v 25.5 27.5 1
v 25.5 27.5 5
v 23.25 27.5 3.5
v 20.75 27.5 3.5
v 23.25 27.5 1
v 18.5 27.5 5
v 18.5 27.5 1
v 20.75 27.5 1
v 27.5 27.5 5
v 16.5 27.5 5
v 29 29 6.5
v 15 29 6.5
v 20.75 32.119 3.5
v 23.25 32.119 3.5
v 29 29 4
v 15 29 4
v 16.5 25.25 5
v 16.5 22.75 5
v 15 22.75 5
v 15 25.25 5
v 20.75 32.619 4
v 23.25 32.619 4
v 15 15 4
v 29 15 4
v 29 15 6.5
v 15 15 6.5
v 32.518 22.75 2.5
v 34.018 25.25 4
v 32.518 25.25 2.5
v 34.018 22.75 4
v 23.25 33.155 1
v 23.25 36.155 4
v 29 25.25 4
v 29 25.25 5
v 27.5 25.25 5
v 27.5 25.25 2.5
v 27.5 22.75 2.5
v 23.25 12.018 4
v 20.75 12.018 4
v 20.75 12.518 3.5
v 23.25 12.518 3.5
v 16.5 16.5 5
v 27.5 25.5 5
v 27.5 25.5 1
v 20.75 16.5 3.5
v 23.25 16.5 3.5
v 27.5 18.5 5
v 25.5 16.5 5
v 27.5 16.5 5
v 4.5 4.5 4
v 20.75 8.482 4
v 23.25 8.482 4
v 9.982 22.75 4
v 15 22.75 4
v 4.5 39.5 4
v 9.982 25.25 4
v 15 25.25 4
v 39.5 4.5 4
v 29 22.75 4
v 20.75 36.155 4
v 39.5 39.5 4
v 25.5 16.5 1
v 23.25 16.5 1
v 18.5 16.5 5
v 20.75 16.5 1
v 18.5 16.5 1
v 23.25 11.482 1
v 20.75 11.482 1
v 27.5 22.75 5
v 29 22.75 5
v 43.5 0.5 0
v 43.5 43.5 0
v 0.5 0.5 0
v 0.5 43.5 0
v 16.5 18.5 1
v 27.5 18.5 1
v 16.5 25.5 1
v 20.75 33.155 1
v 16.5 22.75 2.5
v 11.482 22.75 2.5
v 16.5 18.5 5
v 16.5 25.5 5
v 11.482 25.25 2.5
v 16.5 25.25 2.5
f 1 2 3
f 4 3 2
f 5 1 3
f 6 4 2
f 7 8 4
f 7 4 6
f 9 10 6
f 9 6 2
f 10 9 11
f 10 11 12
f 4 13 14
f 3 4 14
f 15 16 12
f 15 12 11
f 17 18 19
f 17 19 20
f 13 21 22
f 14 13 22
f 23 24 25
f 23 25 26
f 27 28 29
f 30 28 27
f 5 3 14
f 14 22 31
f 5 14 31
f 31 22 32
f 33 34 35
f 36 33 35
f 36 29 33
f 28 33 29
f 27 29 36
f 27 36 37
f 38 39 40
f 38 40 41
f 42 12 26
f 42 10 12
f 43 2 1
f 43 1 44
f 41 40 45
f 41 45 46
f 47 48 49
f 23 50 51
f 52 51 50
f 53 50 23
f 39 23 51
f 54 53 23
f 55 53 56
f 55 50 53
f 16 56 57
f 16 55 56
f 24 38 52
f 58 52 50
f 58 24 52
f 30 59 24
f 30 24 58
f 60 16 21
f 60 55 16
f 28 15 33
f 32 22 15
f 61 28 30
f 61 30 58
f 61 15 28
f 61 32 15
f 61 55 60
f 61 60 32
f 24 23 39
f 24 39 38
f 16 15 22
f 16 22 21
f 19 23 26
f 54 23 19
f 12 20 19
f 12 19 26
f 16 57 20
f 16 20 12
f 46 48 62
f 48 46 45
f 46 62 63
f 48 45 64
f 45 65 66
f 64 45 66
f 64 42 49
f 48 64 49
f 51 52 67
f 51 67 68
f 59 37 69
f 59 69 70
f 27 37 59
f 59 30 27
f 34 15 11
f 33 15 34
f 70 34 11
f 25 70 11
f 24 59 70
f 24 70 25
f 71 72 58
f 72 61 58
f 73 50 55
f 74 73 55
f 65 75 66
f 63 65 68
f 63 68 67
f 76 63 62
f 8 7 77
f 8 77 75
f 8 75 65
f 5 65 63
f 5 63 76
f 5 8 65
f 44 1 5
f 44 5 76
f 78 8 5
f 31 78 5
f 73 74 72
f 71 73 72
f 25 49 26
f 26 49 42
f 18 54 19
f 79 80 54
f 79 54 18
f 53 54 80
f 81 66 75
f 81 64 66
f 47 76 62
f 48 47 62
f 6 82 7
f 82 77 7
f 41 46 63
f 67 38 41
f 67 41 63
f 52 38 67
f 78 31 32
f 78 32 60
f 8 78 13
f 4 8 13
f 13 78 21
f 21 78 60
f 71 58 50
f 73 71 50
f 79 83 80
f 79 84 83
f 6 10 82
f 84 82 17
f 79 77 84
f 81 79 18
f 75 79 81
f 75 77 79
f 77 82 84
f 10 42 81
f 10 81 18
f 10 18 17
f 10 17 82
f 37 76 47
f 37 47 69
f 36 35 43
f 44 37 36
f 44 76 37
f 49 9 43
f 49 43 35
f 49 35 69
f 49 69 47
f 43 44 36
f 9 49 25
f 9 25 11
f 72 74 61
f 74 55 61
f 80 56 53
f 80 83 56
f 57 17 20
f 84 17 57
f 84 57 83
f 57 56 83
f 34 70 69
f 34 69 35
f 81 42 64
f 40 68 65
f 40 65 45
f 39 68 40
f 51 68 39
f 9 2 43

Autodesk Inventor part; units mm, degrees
ref_plane "YZ Plane" through (0, 0, 0) normal (1, 0, 0) x (0, 1, 0)
ref_plane "XZ Plane" through (0, 0, 0) normal (0, 1, 0) x (-1, 0, 0)
sketch "Sketch1" plane through (0, 0, 0) normal (0, 0, 1) x (1, 0, 0)
  line L0 (0, 0) -> (44, 0)
  line L1 (44, 0) -> (44, 44)
  line L2 (44, 44) -> (0, 44)
  line L3 (0, 44) -> (0, 0)
  line L4 (0, 0) -> (0.5, 0)
  line L5 (0.5, 0) -> (0.5, 0.5)
  line L6 (0.5, 0.5) -> (43.5, 0.5)
  line L7 (43.5, 0.5) -> (43.5, 43.5)
  line L8 (43.5, 43.5) -> (0.5, 43.5)
  line L9 (0.5, 43.5) -> (0.5, 0.5)
  dimension "d0" = 44
  dimension "d1" = 44
  dimension "d103" = 0.5
  dimension "d104" = 0.5
  dimension "d105" = 43
  dimension "d106" = 43
extrude "Extrusion1" add sketch "Sketch1" along normal blind 4 contours L9 L8 L7 L6
chamfer "Chamfer1" distance 4 angle 45 4 edges at (43.5, 22, 4) (22, 0.5, 4) (0.5, 22, 4) (22, 43.5, 4)
sketch "Sketch2" plane through (0, 0, 4) normal (0, 0, 1) x (1, 0, 0)
  line L0 (4, 4) -> (40, 40)
  line L1 (22, 16.5) -> (16.5, 16.5)
  line L2 (16.5, 16.5) -> (16.5, 27.5)
  line L3 (16.5, 27.5) -> (27.5, 27.5)
  line L4 (27.5, 27.5) -> (27.5, 16.5)
  line L5 (27.5, 16.5) -> (22, 16.5)
  line L6 (27.5, 27.5) -> (27.5, 25.5)
  arc A0 (18.5, 27.5) -> (16.5, 25.5) centre (18.5, 25.5) ccw
  line L7 (18.5, 25.5) -> (18.5, 18.5)
  line L8 (18.5, 18.5) -> (25.5, 18.5)
  line L9 (25.5, 18.5) -> (25.5, 25.5)
  arc A1 (16.5, 18.5) -> (18.5, 16.5) centre (18.5, 18.5) ccw
  arc A2 (25.5, 16.5) -> (27.5, 18.5) centre (25.5, 18.5) ccw
  arc A3 (27.5, 25.5) -> (25.5, 27.5) centre (25.5, 25.5) ccw
  line L10 (27.5, 18.5) -> (25.5, 16.5)
  line L11 (18.5, 16.5) -> (16.5, 18.5)
  line L12 (16.5, 25.5) -> (18.5, 27.5)
  line L13 (25.5, 27.5) -> (27.5, 25.5)
  point P0 (0, 0)
  dimension "d86" = 2
extrude "Extrusion2" cut sketch "Sketch2" against normal blind 3 contours L0 L11 L2 L12 L3 L13 | L8 L9 L0 L13 L4 L10 L5 L1 L11 | L0 L9 L8
ref_plane "Work Plane4" through (27.5, 27.5, 4) normal (0.7071, -0.7071, 0) x (0, 0, 1)
sketch "Sketch15" plane through (0, 0, 4) normal (0, 0, 1) x (1, 0, 0)
  line L0 (18.5, 16.5) -> (16.5, 18.5) projected
  line L1 (16.5, 18.5) -> (16.5, 25.5) projected
  line L2 (16.5, 25.5) -> (18.5, 27.5) projected
  line L3 (18.5, 27.5) -> (25.5, 27.5) projected
  line L4 (25.5, 27.5) -> (27.5, 25.5) projected
  line L5 (27.5, 25.5) -> (27.5, 18.5) projected
  line L6 (27.5, 18.5) -> (25.5, 16.5) projected
  line L7 (25.5, 16.5) -> (18.5, 16.5) projected
  line L8 (16.5, 18.5) -> (16.5, 25.5) projected
  line L9 (15, 22.9038) -> (15, 29)
  line L10 (15, 29) -> (29, 29)
  line L11 (29, 29) -> (29, 15)
  line L12 (29, 15) -> (15, 15)
  line L13 (15, 15) -> (15, 29)
  line L14 (16.5, 18.5) -> (16.5, 16.5)
  line L15 (16.5, 16.5) -> (18.5, 16.5)
  line L16 (25.5, 16.5) -> (27.5, 16.5)
  line L17 (27.5, 16.5) -> (27.5, 18.5)
  line L18 (27.5, 25.5) -> (27.5, 27.5)
  line L19 (25.5, 27.5) -> (27.5, 25.5) projected
  line L20 (27.5, 27.5) -> (25.5, 27.5)
  line L21 (18.5, 27.5) -> (16.5, 27.5)
  line L22 (16.5, 27.5) -> (16.5, 25.5)
  point P0 (0, 0)
extrude "Extrusion7" add sketch "Sketch15" along normal blind 2.5
chamfer "Chamfer6" distance 1.5 angle 45 4 edges at (22, 16.5, 6.5) (16.5, 22, 6.5) (27.5, 22, 6.5) (22, 27.5, 6.5)
sketch "Sketch16" plane through (0, 0, 4) normal (0, 0, 1) x (1, 0, 0)
  line L0 (16.5, 18.5) -> (16.5, 16.5) projected
  line L1 (16.5, 16.5) -> (18.5, 16.5) projected
  line L2 (18.5, 16.5) -> (16.5, 18.5) projected
  line L3 (27.5, 16.5) -> (27.5, 18.5) projected
  line L4 (27.5, 18.5) -> (25.5, 16.5) projected
  line L5 (25.5, 16.5) -> (27.5, 16.5) projected
  line L6 (25.5, 27.5) -> (27.5, 25.5) projected
  line L7 (27.5, 27.5) -> (25.5, 27.5) projected
  line L8 (25.5, 27.5) -> (27.5, 25.5) projected
  line L9 (27.5, 25.5) -> (27.5, 27.5) projected
  line L10 (18.5, 27.5) -> (16.5, 27.5) projected
  line L11 (16.5, 27.5) -> (16.5, 25.5) projected
  line L12 (16.5, 25.5) -> (18.5, 27.5) projected
  point P0 (0, 0)
extrude "Extrusion8" add sketch "Sketch16" along normal blind 1
ref_plane "Work Plane6" through (22, 18.5, 1) normal (-1, 0, 0) x (0, 0, 1)
ref_plane "Work Plane7" through (18.5, 22, 1) normal (0, 1, 0) x (1, 0, 0)
sketch "Sketch17" plane through (18.5, 22, 1) normal (0, 1, 0) x (1, 0, 0)
  line L0 (7, -4) -> (7, 0) projected
  line L1 (7, 0) -> (0, 0) projected
  line L2 (0, -4) -> (0, 0) projected
  line L3 (7, -4) -> (0, -4) projected
  line L4 (3.5, 0) -> (2.25, 0)
  line L5 (2.25, 0) -> (2.25, -2.5)
  line L6 (2.25, -2.5) -> (4.75, -2.5)
  line L7 (4.75, -2.5) -> (4.75, 0)
  point P0 (-18.5, 1)
  dimension "d109" = 1.25
  dimension "d110" = 2.5
  dimension "d111" = 2.5
sketch "Sketch18" plane through (22, 18.5, 1) normal (-1, 0, 0) x (0, 0, 1)
  line L0 (4, 7) -> (0, 7) projected
  line L1 (0, 7) -> (0, 0) projected
  line L2 (4, 0) -> (0, 0) projected
  line L3 (4, 7) -> (4, 0) projected
  line L4 (0, 3.5) -> (1.25, 3.5)
  line L5 (1.25, 3.5) -> (1.25, -6.5)
  line L6 (1.25, -6.5) -> (6.9224, -12.1724)
  line L7 (1.25, 3.5) -> (1.25, 4.137)
  line L8 (1.25, 4.137) -> (1.25, 14.137)
  line L9 (1.25, 14.137) -> (10.5582, 23.4452)
  point P0 (-1, -18.5)
  dimension "d113" = 10
  dimension "d114" = 135
sweep "Sweep4" cut profiles "Sketch17" path "Sketch18" path curves L5 L6 contours L7 L6 L5 L1
sweep "Sweep5" cut profiles "Sketch17" path "Sketch18" path curves L7 L8 L9 contours L7 L6 L5 L1
ref_plane "Work Plane8" through (18.5, 24, 1) normal (0, 1, 0) x (1, 0, 0)
sketch "Sketch19" plane through (22, 18.5, 1) normal (-1, 0, 0) x (0, 0, 1)
  line L0 (-2.3, 5.5) -> (6.8, 5.5) projected
  line L1 (4, 7) -> (0, 7) projected
  line L2 (0, 7) -> (0, 0) projected
  line L3 (4, 0) -> (0, 0) projected
  line L4 (4, 7) -> (4, 0) projected
  line L5 (4, 0) -> (4, 7) projected
  line L6 (4, 5.5) -> (4, 4.25)
  line L7 (4, 4.25) -> (1.5, 4.25)
  line L8 (1.5, 4.25) -> (1.5, 6.75)
  line L9 (1.5, 6.75) -> (4, 6.75)
  line L10 (4, 6.75) -> (4, 4.25)
  point P0 (-1, -18.5)
  dimension "d127" = 1.25
  dimension "d128" = 2.5
  dimension "d129" = 2.5
sketch "Sketch20" plane through (18.5, 24, 1) normal (0, 1, 0) x (1, 0, 0)
  line L0 (3.5, 2.3) -> (3.5, -6.8) projected
  line L1 (3.5, -4) -> (3.5, -2.75)
  line L2 (3.5, -2.75) -> (-6.5, -2.75)
  line L3 (-6.5, -2.75) -> (-11.0554, -7.3054)
  line L4 (3.5, -2.75) -> (13.5, -2.75)
  line L5 (13.5, -2.75) -> (17.1075, -6.3575)
  point P0 (-18.5, 1)
  point P1 (3.5, -4)
  dimension "d130" = 1.25
  dimension "d131" = 10
  dimension "d132" = 135
  dimension "d134" = 10
sweep "Sweep6" cut profiles "Sketch19" path "Sketch20" path curves L5 L4 L2 L3 contours L8 L9 L4 L0 | L0 L4 L7 L8
properties part number "clear-square-reed-2"
